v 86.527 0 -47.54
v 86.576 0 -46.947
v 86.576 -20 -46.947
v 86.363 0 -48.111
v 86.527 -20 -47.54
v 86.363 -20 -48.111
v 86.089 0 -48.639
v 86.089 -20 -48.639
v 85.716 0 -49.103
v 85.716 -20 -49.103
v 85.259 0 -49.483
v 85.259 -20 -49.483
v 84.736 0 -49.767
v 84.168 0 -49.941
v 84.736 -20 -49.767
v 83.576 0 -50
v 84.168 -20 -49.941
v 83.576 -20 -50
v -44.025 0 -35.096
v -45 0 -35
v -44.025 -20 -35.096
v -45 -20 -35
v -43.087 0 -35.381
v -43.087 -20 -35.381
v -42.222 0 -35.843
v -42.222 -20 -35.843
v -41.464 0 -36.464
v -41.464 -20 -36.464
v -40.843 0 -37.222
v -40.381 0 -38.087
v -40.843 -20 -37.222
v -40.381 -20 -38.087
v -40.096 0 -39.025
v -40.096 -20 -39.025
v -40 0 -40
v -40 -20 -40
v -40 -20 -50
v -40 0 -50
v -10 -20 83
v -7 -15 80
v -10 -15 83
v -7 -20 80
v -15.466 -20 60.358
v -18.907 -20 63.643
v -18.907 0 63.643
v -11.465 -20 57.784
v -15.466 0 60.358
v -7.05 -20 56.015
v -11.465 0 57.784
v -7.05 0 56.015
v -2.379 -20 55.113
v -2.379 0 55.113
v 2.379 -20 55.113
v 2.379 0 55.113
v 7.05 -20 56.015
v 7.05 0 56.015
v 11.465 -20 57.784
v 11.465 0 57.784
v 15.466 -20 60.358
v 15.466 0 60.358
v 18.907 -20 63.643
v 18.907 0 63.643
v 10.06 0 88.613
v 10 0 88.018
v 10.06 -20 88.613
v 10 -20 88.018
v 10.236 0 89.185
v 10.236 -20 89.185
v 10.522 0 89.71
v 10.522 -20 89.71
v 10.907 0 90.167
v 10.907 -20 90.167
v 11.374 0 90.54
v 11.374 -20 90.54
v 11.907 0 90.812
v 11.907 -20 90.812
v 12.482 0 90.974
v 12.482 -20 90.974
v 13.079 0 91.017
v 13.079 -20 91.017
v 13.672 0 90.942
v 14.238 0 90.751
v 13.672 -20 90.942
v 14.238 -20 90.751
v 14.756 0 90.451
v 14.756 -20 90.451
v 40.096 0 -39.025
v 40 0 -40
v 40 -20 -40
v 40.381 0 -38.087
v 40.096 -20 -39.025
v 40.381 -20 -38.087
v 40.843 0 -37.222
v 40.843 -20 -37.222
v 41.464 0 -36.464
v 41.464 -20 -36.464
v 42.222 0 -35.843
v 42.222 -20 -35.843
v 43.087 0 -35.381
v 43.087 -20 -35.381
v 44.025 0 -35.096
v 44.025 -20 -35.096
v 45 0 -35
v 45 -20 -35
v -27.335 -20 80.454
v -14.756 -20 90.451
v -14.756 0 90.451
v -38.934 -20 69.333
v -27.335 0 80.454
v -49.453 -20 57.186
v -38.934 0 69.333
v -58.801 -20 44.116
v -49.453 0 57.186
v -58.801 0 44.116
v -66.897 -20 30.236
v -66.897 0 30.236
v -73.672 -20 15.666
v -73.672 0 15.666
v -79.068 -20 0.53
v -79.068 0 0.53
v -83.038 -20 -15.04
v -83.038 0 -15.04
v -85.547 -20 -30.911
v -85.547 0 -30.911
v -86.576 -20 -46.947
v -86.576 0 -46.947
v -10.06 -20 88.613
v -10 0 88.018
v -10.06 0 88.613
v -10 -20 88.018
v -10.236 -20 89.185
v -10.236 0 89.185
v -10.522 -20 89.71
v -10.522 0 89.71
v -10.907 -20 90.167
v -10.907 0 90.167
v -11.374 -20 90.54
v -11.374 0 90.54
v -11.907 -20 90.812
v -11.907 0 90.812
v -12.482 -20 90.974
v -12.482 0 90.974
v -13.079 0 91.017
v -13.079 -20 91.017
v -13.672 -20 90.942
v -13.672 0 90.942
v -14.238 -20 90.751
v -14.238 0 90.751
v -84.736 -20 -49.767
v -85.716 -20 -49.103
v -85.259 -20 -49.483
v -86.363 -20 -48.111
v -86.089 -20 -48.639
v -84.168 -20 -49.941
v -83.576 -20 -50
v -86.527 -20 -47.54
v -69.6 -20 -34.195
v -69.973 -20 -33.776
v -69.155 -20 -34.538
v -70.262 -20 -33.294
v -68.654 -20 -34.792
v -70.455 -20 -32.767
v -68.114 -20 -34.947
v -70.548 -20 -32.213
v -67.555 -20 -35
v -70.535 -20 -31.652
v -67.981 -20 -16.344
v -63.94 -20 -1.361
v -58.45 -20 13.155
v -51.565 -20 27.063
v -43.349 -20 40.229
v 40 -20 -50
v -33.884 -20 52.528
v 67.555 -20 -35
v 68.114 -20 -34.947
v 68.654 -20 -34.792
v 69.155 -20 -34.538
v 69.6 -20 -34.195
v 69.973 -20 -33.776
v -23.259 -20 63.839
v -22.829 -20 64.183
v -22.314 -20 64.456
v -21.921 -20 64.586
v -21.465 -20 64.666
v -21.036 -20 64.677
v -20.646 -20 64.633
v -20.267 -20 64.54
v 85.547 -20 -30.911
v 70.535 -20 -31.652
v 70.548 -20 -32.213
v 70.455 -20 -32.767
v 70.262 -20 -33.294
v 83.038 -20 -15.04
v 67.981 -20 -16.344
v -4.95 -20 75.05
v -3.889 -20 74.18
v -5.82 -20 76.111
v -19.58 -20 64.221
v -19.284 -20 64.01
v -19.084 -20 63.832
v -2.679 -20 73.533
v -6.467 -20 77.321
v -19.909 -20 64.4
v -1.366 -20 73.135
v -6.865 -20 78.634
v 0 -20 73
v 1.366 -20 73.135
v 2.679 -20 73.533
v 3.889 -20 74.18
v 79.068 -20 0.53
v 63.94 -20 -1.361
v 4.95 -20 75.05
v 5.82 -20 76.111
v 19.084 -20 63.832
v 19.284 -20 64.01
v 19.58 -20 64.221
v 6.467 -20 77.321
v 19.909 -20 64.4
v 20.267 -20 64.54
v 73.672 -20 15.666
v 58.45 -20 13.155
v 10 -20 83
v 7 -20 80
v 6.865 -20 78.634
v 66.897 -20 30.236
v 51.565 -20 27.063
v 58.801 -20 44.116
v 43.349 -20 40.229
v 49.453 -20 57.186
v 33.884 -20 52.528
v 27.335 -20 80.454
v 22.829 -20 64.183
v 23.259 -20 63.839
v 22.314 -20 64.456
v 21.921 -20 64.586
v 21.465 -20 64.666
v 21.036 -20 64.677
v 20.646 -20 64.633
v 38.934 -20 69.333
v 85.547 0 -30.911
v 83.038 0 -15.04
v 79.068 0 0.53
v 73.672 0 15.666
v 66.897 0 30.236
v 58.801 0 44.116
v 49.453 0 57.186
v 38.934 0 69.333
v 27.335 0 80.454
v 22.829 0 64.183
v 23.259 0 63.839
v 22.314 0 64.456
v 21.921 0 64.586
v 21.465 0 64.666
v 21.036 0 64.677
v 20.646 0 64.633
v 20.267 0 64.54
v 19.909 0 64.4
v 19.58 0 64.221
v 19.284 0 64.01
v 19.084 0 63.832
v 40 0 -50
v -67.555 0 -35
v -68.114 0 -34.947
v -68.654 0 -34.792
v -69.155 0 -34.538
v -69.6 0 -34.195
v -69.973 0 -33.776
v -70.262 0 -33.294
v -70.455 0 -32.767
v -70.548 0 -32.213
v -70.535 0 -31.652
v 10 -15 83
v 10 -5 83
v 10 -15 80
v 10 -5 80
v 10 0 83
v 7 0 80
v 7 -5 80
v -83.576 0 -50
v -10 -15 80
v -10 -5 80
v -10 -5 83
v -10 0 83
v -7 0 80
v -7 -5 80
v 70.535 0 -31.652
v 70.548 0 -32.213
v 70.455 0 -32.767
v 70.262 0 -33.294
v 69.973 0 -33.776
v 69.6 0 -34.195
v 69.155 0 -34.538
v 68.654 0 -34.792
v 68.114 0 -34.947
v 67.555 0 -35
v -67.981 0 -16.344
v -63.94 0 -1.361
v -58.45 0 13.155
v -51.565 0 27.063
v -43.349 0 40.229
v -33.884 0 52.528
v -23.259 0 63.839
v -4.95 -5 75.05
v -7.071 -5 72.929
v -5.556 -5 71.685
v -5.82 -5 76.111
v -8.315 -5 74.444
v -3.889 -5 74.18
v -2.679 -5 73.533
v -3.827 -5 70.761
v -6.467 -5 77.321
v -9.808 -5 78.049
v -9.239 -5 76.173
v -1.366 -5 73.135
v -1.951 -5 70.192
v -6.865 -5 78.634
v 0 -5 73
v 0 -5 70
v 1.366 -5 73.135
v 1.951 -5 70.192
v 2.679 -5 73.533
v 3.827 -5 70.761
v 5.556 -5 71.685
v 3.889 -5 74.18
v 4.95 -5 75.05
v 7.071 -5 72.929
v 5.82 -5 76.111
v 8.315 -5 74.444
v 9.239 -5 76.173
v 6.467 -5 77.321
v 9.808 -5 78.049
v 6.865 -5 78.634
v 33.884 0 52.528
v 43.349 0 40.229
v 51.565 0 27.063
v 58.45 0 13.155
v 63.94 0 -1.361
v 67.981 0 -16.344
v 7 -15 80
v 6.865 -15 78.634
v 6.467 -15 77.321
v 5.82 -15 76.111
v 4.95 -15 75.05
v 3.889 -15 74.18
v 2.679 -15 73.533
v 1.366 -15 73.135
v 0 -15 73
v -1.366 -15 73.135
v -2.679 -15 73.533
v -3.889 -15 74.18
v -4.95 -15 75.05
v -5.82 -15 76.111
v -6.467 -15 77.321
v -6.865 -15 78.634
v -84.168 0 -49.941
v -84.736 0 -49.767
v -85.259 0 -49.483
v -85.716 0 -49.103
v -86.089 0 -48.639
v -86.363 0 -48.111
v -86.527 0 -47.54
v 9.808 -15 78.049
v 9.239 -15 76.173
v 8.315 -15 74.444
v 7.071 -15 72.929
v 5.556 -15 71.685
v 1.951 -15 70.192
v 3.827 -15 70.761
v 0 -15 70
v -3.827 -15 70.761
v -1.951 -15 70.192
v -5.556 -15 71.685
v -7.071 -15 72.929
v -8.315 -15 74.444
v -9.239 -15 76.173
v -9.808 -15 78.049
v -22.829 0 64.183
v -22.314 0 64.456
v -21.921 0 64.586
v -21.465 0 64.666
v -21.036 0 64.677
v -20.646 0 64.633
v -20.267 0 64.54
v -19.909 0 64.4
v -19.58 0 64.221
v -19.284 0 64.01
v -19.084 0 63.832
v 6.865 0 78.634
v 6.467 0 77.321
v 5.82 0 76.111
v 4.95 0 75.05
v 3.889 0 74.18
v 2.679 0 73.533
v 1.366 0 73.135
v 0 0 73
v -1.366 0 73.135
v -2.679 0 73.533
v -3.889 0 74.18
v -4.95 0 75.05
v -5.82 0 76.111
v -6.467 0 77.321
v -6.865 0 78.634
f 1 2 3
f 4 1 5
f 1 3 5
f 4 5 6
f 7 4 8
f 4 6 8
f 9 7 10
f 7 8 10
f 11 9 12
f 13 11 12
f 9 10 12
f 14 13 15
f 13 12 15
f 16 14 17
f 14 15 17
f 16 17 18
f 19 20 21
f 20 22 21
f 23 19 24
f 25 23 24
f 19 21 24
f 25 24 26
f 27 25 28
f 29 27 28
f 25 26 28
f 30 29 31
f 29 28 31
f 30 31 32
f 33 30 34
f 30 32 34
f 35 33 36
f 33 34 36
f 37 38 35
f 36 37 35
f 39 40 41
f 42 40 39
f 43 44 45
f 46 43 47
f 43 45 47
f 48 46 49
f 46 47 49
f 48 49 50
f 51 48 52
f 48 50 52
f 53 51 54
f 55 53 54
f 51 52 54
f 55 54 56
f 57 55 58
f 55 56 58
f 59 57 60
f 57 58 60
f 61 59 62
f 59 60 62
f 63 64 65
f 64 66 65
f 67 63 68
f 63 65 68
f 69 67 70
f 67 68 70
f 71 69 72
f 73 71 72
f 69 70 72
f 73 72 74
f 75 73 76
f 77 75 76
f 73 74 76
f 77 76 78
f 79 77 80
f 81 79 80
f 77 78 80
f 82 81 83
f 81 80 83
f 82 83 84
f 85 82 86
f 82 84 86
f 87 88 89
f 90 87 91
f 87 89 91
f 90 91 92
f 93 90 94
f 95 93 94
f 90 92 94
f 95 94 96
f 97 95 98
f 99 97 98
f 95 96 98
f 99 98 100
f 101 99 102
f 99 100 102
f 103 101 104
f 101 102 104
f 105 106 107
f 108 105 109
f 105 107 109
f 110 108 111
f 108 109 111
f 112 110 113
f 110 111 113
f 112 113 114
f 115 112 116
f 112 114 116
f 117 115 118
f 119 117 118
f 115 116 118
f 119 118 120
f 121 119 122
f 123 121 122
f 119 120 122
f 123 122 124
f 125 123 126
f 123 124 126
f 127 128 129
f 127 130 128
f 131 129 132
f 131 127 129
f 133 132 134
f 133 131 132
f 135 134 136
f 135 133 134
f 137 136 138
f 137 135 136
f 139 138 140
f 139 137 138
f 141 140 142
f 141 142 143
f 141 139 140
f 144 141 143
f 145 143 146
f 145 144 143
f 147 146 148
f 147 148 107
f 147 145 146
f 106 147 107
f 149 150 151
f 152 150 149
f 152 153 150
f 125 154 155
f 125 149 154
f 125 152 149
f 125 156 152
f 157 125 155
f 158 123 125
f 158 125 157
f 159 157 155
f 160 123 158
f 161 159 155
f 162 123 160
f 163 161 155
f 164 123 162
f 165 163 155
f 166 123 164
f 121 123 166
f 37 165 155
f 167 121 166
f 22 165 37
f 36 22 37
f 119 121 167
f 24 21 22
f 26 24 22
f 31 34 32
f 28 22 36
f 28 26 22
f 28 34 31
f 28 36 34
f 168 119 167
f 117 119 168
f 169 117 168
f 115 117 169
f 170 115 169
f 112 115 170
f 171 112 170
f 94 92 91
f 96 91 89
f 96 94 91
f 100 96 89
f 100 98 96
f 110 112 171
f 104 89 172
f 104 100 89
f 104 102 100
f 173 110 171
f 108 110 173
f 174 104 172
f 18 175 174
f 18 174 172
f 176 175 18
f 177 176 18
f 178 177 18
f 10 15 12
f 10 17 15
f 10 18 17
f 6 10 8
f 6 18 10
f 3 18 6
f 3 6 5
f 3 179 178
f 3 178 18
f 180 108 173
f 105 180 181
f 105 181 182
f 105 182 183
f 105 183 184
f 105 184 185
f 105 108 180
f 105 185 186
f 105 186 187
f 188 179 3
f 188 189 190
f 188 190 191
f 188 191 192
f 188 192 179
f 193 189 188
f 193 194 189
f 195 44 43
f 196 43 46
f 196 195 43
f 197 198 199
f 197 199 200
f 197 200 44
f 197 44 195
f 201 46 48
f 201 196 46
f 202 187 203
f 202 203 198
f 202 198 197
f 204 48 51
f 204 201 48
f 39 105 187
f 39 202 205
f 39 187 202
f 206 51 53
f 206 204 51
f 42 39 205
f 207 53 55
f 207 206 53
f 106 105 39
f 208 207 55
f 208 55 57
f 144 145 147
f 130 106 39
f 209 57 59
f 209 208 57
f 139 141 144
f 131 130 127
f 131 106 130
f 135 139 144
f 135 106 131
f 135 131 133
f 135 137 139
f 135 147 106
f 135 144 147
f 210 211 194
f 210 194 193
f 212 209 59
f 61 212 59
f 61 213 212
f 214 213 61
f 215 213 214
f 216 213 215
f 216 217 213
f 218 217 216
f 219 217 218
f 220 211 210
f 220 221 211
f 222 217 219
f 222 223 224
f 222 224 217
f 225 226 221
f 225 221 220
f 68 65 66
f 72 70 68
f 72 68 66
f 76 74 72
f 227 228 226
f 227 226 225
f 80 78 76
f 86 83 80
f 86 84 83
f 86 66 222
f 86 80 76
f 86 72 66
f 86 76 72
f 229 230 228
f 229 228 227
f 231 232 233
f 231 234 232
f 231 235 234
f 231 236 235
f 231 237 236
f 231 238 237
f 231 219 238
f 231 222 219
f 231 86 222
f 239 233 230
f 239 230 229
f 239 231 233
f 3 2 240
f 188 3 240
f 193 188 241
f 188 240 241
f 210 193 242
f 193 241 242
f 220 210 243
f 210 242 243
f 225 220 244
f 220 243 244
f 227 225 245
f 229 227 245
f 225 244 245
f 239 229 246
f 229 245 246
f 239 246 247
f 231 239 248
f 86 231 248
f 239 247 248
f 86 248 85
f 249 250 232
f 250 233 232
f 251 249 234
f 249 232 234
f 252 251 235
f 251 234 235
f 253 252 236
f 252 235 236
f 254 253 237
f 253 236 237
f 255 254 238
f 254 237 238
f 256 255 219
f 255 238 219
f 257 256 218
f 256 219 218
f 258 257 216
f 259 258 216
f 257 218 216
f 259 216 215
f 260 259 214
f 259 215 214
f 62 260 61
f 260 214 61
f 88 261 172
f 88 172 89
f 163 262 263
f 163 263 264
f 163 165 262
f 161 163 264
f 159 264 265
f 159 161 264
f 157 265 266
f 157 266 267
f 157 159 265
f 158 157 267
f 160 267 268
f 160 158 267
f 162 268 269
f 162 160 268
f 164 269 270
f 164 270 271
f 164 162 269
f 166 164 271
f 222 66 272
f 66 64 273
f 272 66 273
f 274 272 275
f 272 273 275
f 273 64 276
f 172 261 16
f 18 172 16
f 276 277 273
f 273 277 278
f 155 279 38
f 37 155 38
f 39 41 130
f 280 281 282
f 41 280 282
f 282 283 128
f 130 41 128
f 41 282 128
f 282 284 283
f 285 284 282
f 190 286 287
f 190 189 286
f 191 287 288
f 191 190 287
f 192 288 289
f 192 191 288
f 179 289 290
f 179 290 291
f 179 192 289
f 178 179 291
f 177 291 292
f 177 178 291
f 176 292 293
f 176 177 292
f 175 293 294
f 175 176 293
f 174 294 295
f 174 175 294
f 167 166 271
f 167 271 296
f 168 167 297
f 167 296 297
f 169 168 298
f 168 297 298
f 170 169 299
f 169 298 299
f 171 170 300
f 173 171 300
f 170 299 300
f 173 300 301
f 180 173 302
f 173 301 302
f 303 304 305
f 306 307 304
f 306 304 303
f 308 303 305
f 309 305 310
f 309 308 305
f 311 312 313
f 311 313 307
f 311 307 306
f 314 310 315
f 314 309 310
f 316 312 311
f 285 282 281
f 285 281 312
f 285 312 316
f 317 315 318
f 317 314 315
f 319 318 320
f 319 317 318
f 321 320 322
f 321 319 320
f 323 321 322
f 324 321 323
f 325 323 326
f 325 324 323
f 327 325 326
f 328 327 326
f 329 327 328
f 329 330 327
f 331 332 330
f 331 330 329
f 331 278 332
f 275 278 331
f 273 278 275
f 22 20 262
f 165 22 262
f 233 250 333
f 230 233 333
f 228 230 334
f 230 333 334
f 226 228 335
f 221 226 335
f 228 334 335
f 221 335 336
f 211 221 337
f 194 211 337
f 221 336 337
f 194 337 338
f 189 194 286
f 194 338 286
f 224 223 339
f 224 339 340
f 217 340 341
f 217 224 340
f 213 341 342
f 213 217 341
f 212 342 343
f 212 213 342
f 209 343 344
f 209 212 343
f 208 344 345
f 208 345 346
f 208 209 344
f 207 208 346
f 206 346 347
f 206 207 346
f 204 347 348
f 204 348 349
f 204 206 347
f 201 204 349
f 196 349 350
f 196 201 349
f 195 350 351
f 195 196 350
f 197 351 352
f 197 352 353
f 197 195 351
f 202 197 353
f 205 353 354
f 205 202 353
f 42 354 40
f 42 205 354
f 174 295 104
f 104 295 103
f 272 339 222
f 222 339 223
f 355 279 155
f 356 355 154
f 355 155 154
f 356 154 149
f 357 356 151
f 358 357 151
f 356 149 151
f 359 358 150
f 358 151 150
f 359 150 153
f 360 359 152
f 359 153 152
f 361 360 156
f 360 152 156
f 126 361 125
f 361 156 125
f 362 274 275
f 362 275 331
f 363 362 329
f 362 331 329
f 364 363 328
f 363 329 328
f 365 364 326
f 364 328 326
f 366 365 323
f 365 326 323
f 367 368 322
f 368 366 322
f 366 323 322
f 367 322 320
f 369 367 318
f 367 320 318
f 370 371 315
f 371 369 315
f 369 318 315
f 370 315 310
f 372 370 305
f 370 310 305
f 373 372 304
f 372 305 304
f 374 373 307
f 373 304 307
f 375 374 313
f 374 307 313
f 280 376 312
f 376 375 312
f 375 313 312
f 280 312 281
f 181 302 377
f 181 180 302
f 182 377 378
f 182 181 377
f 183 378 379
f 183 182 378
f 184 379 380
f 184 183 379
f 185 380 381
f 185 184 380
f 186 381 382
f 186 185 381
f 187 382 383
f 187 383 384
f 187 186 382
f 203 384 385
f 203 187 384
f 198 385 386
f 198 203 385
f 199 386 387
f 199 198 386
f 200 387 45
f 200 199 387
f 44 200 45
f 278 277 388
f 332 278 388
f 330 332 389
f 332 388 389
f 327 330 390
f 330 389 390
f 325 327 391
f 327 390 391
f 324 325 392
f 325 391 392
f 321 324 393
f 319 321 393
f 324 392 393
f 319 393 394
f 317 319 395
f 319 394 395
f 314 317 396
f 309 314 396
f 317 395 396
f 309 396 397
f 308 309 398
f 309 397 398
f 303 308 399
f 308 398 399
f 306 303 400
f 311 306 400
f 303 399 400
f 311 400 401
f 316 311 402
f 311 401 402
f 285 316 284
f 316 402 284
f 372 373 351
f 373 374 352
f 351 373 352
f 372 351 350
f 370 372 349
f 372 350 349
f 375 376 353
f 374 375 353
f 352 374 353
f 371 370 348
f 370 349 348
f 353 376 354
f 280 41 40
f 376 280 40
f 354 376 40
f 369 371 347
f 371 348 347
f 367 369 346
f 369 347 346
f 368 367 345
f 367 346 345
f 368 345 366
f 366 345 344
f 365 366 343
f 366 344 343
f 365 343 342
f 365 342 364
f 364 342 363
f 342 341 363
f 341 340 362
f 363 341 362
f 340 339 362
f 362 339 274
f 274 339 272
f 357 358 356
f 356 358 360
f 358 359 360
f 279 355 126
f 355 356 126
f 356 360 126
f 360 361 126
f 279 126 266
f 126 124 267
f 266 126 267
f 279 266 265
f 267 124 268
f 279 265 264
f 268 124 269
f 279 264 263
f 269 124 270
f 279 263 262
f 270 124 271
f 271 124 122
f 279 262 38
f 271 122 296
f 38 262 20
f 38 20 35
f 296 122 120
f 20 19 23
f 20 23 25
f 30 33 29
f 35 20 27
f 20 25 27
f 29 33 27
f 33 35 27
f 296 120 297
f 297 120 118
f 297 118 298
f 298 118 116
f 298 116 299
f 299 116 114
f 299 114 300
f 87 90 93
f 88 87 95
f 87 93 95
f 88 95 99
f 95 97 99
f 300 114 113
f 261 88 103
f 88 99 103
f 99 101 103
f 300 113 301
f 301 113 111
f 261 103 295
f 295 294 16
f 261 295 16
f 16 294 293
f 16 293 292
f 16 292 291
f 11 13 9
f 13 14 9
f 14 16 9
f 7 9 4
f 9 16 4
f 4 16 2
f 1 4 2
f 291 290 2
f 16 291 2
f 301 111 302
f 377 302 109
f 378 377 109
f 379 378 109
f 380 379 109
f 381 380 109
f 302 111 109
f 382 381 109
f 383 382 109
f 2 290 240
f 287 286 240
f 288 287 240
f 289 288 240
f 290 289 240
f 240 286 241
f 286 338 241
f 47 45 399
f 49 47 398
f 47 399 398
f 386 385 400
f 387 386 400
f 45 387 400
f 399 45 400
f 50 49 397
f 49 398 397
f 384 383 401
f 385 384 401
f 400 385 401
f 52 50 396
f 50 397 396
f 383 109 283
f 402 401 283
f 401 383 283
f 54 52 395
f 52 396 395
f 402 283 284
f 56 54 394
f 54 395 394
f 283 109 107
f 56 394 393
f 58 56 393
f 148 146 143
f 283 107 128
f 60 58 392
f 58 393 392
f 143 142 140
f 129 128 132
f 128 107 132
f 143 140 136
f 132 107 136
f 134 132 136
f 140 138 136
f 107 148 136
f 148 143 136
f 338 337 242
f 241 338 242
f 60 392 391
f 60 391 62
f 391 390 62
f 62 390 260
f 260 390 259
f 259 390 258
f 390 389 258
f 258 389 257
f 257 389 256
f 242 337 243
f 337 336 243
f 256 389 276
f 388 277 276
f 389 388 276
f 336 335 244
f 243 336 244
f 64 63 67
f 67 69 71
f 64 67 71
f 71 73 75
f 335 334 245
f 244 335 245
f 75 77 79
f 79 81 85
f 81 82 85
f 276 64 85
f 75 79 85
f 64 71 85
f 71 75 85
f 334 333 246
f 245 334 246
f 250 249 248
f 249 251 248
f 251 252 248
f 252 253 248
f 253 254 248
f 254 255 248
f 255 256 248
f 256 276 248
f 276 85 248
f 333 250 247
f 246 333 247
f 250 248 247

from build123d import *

# Parameters (mm, degrees)
F1_DEPTH = 20
F2_DEPTH = 5
F4_R     = 3
F5_SIZE  = 2.99999
F6_W     = 80
F6_H     = 15
F7_DEPTH = 20
F8_R     = 5


# Not quite as in the source:
# - a fillet or chamfer is up to 0.001 mm smaller than in the source, because OpenCascade refuses the exact size
# - a pattern or mirror of a feature is missing from the dataset's text; its kind, count and spacing are read off the source's solid


with BuildPart() as f1:
    # F0 (on Front) → F1 (new body)
    with BuildSketch(Plane.XZ):
        with BuildLine():
            Line((-86.6025403784, -50), (86.6025403784, -50))
            ThreePointArc((86.6025403784, -50), (66.25695525, 31.4492148287), (10, 93.7635182946))
            Line((10, 93.7635182946), (10, 80))
            ThreePointArc((10, 80), (0, 70), (-10, 80))
            Line((-10, 80), (-10, 93.7635182946))
            ThreePointArc((-10, 93.7635182946), (-66.25695525, 31.4492148287), (-86.6025403784, -50))
        make_face()
        with BuildLine():
            ThreePointArc((20.8128184267, 66.1498526475), (55.1784519137, 20.1925765445), (70.8898326981, -35))
            Line((70.8898326981, -35), (-70.8898326981, -35))
            ThreePointArc((-70.8898326981, -35), (-55.1784519137, 20.1925765445), (-20.8128184267, 66.1498526475))
            ThreePointArc((-20.8128184267, 66.1498526475), (0, 55.000000149), (20.8128184267, 66.1498526475))
        make_face(mode=Mode.SUBTRACT)
    extrude(amount=F1_DEPTH)

    # F0 (on Front) → F2 (join)
    with BuildSketch(Plane.XZ):
        with BuildLine():
            ThreePointArc((-10, 80), (0, 70), (10, 80))
            Line((10, 80), (7, 80))
            ThreePointArc((7, 80), (0, 73), (-7, 80))
            Line((-7, 80), (-10, 80))
        make_face()
    f2 = extrude(amount=F2_DEPTH)

    # F2_copies: F2 across plane
    add(f2.mirror(Plane(origin=(0, -10, 0), x_dir=(0, 0, -1), z_dir=(0, -1, 0))))

    # F4
    f4_edges = [f1.edges().sort_by_distance(p)[0] for p in [
        (-10, -10, 93.763518),
        (10, -10, 93.763518),
        (86.60254, -10, -50),
        (-86.60254, -10, -50),
        (-70.889833, -10, -35),
        (70.889833, -10, -35),
        (20.812818, -10, 66.149853),
        (-20.812818, -10, 66.149853),
    ]]
    fillet(f4_edges, radius=F4_R)

    # F5 (size 3 in the source; OpenCascade refuses exactly that, so slightly less here)
    f5_edges = [f1.edges().sort_by_distance(p)[0] for p in [
        (-10, -2.5, 80),
        (-10, -10, 80),
        (-10, -17.5, 80),
        (10, -2.5, 80),
        (10, -10, 80),
        (10, -17.5, 80),
    ]]
    chamfer(f5_edges, length=F5_SIZE)

    # F6 (on face) → F7 (cut, through all)
    with BuildSketch(Plane(origin=(0, 0, 0), x_dir=(-1, 0, 0), z_dir=(0, 1, 0))):
        with Locations((0, -42.5)):
            Rectangle(F6_W, F6_H)
    extrude(amount=-F7_DEPTH, mode=Mode.SUBTRACT)

    # F8
    f8_edges = [f1.edges().sort_by_distance(p)[0] for p in [
        (40, -10, -35),
        (-40, -10, -35),
    ]]
    fillet(f8_edges, radius=F8_R)


solid = f1.part
